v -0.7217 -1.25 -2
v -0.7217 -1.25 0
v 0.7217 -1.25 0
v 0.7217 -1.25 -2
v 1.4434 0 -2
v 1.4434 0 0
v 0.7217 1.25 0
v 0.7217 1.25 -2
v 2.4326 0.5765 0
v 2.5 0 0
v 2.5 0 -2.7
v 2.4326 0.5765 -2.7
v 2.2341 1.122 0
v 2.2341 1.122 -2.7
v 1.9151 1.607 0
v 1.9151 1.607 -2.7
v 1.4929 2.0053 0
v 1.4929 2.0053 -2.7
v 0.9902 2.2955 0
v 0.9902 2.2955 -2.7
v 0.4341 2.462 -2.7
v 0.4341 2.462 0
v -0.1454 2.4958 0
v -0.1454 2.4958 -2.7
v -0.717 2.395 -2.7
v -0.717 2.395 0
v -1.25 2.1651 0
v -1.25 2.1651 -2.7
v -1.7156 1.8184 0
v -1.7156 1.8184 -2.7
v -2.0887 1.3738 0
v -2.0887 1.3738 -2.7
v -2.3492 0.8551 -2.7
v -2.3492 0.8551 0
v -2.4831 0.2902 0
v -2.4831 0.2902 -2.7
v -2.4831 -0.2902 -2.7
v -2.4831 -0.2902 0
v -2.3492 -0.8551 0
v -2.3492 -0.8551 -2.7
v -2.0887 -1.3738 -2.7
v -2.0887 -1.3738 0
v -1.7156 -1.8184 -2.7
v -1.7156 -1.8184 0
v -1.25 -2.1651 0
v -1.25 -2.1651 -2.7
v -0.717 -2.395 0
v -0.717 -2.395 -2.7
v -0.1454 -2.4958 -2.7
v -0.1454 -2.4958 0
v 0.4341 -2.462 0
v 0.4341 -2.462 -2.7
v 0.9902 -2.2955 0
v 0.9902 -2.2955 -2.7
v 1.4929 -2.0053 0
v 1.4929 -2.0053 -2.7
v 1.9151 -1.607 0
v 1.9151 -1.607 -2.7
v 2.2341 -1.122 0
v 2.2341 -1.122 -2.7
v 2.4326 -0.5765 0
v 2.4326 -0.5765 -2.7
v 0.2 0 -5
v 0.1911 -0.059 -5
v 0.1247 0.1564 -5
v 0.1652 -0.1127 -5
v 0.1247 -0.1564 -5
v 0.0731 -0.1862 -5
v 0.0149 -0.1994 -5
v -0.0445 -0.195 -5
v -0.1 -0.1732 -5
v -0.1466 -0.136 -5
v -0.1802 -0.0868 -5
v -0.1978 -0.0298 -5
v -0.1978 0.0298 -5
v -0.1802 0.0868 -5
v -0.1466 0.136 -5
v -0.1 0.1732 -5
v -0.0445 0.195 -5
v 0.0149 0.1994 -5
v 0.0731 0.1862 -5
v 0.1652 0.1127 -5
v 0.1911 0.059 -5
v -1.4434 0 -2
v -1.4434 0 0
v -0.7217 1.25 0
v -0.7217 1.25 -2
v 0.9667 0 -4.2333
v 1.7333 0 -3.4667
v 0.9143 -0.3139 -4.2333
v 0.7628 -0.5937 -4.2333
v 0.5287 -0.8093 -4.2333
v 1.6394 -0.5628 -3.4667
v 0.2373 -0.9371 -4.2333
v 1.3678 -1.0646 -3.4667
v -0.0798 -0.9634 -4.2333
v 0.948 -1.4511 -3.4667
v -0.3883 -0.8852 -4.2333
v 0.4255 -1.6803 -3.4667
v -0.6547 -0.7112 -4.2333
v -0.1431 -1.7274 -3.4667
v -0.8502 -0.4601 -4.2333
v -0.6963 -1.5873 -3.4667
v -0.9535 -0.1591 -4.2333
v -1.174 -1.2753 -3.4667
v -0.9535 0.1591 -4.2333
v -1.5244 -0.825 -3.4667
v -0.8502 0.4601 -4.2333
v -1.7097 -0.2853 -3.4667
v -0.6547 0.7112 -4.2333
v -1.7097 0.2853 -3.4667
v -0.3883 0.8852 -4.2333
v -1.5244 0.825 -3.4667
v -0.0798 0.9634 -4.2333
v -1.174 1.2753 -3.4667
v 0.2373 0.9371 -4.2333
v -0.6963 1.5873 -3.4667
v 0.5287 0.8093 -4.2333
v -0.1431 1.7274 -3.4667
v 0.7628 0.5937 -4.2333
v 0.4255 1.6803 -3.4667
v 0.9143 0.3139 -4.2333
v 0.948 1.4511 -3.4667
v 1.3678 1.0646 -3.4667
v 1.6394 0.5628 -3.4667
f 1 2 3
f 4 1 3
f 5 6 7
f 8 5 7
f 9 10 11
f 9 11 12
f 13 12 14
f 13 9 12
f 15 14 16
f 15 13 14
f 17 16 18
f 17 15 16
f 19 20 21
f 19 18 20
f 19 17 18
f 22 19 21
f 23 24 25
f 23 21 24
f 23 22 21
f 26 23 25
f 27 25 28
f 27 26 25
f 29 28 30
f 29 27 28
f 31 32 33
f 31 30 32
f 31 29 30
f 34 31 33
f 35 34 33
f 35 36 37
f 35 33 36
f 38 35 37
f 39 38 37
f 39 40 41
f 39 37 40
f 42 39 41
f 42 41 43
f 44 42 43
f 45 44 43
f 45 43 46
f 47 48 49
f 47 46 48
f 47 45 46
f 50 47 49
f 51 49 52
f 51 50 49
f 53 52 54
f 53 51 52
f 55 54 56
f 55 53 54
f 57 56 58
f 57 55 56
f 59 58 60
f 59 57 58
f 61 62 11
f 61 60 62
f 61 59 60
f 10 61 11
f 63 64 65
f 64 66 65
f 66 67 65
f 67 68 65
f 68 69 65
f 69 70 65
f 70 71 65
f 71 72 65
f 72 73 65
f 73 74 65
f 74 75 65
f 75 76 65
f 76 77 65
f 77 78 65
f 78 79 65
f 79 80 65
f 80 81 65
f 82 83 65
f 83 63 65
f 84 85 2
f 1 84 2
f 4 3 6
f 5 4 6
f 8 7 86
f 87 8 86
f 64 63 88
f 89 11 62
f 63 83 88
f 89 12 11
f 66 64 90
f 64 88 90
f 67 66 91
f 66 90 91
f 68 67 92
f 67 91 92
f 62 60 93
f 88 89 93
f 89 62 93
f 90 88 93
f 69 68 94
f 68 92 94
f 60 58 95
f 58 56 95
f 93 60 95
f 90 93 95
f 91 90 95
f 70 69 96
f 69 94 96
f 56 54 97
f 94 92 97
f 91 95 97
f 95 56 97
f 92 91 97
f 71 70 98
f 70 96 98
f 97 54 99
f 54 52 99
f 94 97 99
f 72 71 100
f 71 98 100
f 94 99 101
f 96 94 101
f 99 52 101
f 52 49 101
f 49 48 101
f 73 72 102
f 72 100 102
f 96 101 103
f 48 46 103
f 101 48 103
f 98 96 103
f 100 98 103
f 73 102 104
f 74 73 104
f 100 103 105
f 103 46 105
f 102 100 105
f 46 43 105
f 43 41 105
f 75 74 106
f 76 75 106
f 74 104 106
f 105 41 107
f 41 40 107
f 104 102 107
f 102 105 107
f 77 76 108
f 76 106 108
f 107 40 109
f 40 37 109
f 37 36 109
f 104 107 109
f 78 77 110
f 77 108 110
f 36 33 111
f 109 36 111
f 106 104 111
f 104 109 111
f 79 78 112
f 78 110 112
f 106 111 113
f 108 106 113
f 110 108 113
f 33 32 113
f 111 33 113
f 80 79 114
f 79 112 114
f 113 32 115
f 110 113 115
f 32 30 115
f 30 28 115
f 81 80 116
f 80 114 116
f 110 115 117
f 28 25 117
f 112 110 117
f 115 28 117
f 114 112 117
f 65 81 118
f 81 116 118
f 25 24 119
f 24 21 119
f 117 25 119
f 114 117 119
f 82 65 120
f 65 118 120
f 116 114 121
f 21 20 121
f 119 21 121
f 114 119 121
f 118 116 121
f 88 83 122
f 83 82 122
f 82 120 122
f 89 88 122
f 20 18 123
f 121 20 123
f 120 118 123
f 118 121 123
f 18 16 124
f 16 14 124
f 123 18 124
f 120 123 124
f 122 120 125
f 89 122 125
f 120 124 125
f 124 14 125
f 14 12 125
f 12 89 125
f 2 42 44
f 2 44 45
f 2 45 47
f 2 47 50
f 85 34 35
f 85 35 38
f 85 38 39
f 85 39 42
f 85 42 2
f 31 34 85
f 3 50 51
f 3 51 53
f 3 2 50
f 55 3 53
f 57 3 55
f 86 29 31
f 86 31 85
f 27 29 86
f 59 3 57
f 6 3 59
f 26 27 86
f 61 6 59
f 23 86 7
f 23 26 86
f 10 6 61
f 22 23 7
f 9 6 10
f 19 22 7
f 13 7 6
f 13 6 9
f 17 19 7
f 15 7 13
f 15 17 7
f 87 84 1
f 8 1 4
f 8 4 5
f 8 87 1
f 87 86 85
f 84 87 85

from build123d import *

# Parameters (mm, degrees)
SKETCH1_R           = 2.5
BOSS_EXTRUDE1_DEPTH = 5
CUT_EXTRUDE1_DEPTH  = 2


with BuildPart() as part:
    # Sketch1 → Boss-Extrude1 (new body)
    with BuildSketch(Plane.XY):
        Circle(SKETCH1_R)
    extrude(amount=-BOSS_EXTRUDE1_DEPTH)

    # Sketch2 → Cut-Extrude1 (cut)
    with BuildSketch(Plane.XY):
        Polygon((1.443375673, 0), (0.721687836, 1.25), (-0.721687836, 1.25), (-1.443375673, 0), (-0.721687836, -1.25), (0.721687836, -1.25), align=None)
    extrude(amount=-CUT_EXTRUDE1_DEPTH, mode=Mode.SUBTRACT)

    # Sketch3 → Chamfer 2 (revolve, cut)
    with BuildSketch(Plane(origin=(0, 0, 0), x_dir=(0, 0, -1), z_dir=(1, 0, 0)), mode=Mode.PRIVATE) as chamfer_2_sk:
        Polygon((5, 2.5), (5, 0.2), (2.7, 2.5), align=None)
    revolve(chamfer_2_sk.sketch.rotate(Axis((0, 0, 0), (0, 0, -1)), 90), axis=Axis((0, 0, 0), (0, 0, -1)), mode=Mode.SUBTRACT)


solid = part.part
